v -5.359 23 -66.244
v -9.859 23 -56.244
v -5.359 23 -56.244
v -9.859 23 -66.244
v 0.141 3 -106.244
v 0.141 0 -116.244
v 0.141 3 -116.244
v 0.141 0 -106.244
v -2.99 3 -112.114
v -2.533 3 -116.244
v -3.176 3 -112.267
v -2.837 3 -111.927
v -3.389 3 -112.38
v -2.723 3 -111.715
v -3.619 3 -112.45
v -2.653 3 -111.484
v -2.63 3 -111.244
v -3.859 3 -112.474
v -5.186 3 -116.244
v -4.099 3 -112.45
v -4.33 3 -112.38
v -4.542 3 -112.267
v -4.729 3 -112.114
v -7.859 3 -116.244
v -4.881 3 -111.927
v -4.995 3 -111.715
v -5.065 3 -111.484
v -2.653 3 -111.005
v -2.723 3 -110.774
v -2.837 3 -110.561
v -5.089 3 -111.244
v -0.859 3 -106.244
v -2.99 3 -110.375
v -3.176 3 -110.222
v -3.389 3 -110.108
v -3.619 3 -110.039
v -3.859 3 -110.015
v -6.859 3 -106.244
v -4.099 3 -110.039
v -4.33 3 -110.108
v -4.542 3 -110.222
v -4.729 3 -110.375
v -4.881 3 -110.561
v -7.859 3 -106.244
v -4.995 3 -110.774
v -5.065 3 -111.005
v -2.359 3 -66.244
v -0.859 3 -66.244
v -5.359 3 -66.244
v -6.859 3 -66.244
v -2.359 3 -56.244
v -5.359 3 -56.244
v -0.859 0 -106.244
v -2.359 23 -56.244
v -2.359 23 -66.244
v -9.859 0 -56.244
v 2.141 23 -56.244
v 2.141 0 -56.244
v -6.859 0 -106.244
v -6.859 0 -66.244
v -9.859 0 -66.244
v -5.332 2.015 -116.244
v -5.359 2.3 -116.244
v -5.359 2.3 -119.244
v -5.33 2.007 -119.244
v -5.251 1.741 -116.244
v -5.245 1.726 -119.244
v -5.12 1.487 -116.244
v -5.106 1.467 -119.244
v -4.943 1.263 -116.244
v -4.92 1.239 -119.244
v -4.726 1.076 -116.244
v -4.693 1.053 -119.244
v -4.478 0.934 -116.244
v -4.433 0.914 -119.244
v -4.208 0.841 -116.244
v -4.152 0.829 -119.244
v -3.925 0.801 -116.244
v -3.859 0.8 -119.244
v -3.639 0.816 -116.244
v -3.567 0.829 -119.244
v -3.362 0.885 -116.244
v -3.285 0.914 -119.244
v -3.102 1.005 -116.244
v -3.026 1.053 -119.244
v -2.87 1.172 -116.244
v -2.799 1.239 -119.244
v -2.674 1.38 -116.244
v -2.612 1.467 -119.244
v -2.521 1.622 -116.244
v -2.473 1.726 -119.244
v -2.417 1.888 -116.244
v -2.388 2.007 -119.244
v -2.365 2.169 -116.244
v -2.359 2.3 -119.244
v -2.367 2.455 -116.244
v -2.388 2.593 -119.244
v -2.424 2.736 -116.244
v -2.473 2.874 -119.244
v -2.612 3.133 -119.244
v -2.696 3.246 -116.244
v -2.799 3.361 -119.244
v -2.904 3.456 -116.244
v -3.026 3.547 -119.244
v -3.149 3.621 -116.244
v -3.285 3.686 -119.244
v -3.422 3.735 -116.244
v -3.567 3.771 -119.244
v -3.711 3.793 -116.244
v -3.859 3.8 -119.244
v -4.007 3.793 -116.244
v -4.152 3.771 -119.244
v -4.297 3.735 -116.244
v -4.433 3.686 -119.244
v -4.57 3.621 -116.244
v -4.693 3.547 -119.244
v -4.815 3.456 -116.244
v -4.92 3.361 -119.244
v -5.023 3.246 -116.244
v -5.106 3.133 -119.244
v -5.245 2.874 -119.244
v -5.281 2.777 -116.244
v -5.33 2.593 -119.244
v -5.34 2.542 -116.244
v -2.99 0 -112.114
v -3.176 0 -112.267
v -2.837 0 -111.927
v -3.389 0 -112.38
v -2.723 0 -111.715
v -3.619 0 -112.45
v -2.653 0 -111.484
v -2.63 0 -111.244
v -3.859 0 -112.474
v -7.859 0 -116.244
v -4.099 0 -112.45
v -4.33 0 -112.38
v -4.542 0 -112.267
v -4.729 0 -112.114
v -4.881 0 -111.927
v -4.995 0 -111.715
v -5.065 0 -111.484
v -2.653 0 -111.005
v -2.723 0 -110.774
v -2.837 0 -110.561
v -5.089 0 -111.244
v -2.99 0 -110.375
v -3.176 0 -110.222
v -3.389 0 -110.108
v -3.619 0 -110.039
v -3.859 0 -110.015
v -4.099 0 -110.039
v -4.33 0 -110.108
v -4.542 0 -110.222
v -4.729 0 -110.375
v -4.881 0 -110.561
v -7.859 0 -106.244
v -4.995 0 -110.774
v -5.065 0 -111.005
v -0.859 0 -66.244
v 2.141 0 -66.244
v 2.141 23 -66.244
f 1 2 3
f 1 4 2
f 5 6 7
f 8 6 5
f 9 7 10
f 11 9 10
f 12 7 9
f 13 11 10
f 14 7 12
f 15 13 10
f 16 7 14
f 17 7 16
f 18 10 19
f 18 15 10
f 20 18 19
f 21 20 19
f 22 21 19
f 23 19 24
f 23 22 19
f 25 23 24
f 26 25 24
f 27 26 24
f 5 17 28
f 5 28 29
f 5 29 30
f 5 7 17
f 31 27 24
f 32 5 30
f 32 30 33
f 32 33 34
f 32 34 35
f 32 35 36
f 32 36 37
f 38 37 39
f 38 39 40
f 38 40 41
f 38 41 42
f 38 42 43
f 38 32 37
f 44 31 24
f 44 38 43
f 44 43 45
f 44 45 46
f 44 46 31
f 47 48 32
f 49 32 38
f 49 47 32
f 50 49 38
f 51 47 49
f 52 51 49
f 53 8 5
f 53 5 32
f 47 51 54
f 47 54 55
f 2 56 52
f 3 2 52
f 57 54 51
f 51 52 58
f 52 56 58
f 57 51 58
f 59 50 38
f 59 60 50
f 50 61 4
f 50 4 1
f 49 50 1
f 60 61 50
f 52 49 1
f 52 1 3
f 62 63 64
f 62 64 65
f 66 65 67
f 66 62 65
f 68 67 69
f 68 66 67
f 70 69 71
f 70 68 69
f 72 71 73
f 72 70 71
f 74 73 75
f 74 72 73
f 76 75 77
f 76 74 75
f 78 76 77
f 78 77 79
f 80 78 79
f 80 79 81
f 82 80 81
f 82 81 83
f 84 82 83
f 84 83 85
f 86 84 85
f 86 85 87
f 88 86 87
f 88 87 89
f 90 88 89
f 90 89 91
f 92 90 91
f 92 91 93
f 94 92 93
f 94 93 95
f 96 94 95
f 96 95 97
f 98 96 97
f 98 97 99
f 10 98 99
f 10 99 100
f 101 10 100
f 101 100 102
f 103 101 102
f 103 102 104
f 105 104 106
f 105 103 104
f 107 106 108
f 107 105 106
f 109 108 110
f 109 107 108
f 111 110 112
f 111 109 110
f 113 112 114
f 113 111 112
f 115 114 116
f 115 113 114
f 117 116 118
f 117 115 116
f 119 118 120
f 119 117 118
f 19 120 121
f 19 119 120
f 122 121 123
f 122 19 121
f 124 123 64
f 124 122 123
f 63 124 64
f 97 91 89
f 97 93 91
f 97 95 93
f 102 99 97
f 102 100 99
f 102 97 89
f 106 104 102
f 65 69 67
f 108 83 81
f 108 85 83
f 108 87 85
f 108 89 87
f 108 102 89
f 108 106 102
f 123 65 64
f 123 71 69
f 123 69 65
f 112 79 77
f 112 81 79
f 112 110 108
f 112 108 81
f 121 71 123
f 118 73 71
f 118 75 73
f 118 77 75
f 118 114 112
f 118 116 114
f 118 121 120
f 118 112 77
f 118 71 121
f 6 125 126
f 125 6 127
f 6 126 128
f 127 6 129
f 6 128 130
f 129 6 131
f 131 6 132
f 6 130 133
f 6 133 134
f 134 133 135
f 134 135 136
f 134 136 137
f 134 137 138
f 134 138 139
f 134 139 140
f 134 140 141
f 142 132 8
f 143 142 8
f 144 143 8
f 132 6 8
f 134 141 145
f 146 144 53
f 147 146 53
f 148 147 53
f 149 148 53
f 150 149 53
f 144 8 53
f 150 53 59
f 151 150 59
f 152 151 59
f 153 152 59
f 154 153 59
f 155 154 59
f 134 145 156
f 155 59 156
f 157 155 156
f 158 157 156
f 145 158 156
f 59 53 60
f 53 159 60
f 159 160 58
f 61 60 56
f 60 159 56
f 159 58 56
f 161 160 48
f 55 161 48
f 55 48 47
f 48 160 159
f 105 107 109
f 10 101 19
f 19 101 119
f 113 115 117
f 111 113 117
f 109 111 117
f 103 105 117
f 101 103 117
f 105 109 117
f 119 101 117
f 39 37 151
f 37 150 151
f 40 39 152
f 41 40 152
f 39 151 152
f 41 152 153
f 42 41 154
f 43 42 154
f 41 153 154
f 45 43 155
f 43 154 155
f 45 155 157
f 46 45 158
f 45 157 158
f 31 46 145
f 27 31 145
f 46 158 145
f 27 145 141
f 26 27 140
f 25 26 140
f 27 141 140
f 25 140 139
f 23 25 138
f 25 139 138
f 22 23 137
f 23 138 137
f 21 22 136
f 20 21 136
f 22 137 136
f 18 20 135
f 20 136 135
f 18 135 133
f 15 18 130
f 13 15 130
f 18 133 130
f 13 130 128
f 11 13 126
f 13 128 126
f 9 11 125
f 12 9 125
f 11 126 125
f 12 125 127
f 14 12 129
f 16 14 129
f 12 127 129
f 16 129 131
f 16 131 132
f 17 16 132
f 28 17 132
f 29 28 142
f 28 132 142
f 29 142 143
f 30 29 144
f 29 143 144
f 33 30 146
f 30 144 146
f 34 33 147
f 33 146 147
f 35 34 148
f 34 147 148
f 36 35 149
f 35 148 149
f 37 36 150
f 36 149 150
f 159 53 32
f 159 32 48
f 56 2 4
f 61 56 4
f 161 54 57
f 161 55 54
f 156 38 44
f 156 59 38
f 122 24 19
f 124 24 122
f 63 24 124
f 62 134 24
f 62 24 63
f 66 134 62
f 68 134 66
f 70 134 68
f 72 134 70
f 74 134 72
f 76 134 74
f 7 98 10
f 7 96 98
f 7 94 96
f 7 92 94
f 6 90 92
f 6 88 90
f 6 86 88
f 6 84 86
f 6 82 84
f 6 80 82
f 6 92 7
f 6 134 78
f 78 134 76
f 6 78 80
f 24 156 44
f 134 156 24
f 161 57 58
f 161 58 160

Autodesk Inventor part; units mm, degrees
ref_plane "YZ Plane" through (0, 0, 0) normal (1, 0, 0) x (0, 1, 0)
ref_plane "XZ Plane" through (0, 0, 0) normal (0, 1, 0) x (-1, 0, 0)
ref_plane "XY Plane" through (0, 0, 0) normal (0, 0, 1) x (1, 0, 0)
sketch "Skizze1" plane through (0, 0, 0) normal (0, 1, 0) x (-1, 0, 0)
  line L0 (6.8592, -116.2444) -> (0.8592, -116.2444)
  line L1 (0.8592, -116.2444) -> (0.8592, -56.2444)
  line L2 (6.8592, -56.2444) -> (6.8592, -116.2444)
  line L3 (7.8592, -116.2444) -> (-0.1408, -116.2444)
  line L4 (-0.1408, -116.2444) -> (-0.1408, -106.2444)
  line L5 (-0.1408, -106.2444) -> (7.8592, -106.2444)
  line L6 (7.8592, -106.2444) -> (7.8592, -116.2444)
  line L7 (3.8592, 157.3916) -> (3.8592, -262.6084)
  line L8 (6.8592, -56.2444) -> (0.8592, -56.2444)
  line L9 (0.8592, -56.2444) -> (-2.1408, -56.2444)
  line L10 (-2.1408, -56.2444) -> (-2.1408, -66.2444)
  line L11 (-2.1408, -66.2444) -> (0.8592, -66.2444)
  line L12 (0.8592, -66.2444) -> (0.8592, -56.2444)
  line L13 (6.8592, -56.2444) -> (9.8592, -56.2444)
  line L14 (9.8592, -56.2444) -> (9.8592, -66.2444)
  line L15 (9.8592, -66.2444) -> (6.8592, -66.2444)
  line L16 (6.8592, -66.2444) -> (6.8592, -56.2444)
  point P0 (0, 0)
  point P1 (0.8592, -106.2444)
  point P2 (6.8592, -106.2444)
  point P3 (6.8592, -116.2444)
  point P4 (3.8592, -116.2444)
  point P5 (6.8592, -66.2444)
  point P6 (0.8592, -66.2444)
  dimension "d1" = 60
  dimension "d9" = 6
  dimension "d25" = 8
  dimension "d26" = 10
  dimension "d27" = 1
  dimension "d44" = 3
  dimension "d45" = 10
  dimension "d46" = 3
extrude "Extrusion1" add sketch "Skizze1" along normal blind 3
sketch "Skizze2" plane through (0, 3, 0) normal (0, 1, 0) x (1, 0, 0)
  line L0 (-3.8592, 111.2444) -> (-6.8592, 111.2444) construction
  line L1 (-3.8592, 111.2444) -> (-0.8592, 111.2444) construction
  line L2 (-0.8592, 66.2444) -> (-0.8592, 106.2444) construction
  line L3 (-6.8592, 106.2444) -> (-6.8592, 66.2444) construction
  line L4 (0.1408, 116.2444) -> (-7.8592, 116.2444) projected
  point P0 (0, 0)
  point P1 (-0.8592, 56.2444)
  point P2 (-6.8592, 56.2444)
  point P3 (-0.8592, 16.2444)
  point P4 (-6.8592, 16.2444)
  dimension "d28" = 5
hole "Bohrung1" at (-3.8592, 3, -111.2444) direction (0, -1, 0) diameter 2.459 end through all thread size "M3x0.5" class "6H" standard "ANSI Metric M Profile"
sketch "Skizze3" plane through (0.1408, 0, -116.2444) normal (0, 0, -1) x (-1, 0, 0)
  line L0 (4, 0) -> (4, 2.3)
  circle A0 centre (4, 2.3) radius 1.5
  line L1 (0, 0) -> (8, 0) projected
  point P0 (0.1408, 0)
  dimension "d29" = 3
  dimension "d30" = 2.3
extrude "Extrusion2" add sketch "Skizze3" along normal blind 3
sketch "Skizze5" plane through (0, 3, 0) normal (0, 1, 0) x (1, 0, 0)
  line L0 (2.1408, 56.2444) -> (-9.8592, 56.2444)
  line L1 (-9.8592, 66.2444) -> (2.1408, 66.2444)
  line L2 (2.1408, 66.2444) -> (2.1408, 56.2444)
  line L3 (-5.3592, 56.2444) -> (-2.3592, 56.2444)
  line L4 (-2.3592, 56.2444) -> (-2.3592, 66.2444)
  line L5 (-2.3592, 66.2444) -> (-5.3592, 66.2444)
  line L6 (-5.3592, 66.2444) -> (-5.3592, 56.2444)
  line L7 (-5.3592, 61.2444) -> (-9.8592, 61.2444) construction
  line L8 (-2.3592, 61.2444) -> (2.1408, 61.2444) construction
  line L9 (-9.8592, 66.2444) -> (-9.8592, 56.2444)
  point P0 (0, 0)
  point P1 (-2.3592, 56.2444)
  dimension "d43" = 3
extrude "Extrusion4" add sketch "Skizze5" along normal blind 20 contours L0 L4 L1 L2 | L0 L9 L1 L6
properties part number "SchubstangeA" material "PC/ABS-Kunststoff, 3DDruck, PLA"
